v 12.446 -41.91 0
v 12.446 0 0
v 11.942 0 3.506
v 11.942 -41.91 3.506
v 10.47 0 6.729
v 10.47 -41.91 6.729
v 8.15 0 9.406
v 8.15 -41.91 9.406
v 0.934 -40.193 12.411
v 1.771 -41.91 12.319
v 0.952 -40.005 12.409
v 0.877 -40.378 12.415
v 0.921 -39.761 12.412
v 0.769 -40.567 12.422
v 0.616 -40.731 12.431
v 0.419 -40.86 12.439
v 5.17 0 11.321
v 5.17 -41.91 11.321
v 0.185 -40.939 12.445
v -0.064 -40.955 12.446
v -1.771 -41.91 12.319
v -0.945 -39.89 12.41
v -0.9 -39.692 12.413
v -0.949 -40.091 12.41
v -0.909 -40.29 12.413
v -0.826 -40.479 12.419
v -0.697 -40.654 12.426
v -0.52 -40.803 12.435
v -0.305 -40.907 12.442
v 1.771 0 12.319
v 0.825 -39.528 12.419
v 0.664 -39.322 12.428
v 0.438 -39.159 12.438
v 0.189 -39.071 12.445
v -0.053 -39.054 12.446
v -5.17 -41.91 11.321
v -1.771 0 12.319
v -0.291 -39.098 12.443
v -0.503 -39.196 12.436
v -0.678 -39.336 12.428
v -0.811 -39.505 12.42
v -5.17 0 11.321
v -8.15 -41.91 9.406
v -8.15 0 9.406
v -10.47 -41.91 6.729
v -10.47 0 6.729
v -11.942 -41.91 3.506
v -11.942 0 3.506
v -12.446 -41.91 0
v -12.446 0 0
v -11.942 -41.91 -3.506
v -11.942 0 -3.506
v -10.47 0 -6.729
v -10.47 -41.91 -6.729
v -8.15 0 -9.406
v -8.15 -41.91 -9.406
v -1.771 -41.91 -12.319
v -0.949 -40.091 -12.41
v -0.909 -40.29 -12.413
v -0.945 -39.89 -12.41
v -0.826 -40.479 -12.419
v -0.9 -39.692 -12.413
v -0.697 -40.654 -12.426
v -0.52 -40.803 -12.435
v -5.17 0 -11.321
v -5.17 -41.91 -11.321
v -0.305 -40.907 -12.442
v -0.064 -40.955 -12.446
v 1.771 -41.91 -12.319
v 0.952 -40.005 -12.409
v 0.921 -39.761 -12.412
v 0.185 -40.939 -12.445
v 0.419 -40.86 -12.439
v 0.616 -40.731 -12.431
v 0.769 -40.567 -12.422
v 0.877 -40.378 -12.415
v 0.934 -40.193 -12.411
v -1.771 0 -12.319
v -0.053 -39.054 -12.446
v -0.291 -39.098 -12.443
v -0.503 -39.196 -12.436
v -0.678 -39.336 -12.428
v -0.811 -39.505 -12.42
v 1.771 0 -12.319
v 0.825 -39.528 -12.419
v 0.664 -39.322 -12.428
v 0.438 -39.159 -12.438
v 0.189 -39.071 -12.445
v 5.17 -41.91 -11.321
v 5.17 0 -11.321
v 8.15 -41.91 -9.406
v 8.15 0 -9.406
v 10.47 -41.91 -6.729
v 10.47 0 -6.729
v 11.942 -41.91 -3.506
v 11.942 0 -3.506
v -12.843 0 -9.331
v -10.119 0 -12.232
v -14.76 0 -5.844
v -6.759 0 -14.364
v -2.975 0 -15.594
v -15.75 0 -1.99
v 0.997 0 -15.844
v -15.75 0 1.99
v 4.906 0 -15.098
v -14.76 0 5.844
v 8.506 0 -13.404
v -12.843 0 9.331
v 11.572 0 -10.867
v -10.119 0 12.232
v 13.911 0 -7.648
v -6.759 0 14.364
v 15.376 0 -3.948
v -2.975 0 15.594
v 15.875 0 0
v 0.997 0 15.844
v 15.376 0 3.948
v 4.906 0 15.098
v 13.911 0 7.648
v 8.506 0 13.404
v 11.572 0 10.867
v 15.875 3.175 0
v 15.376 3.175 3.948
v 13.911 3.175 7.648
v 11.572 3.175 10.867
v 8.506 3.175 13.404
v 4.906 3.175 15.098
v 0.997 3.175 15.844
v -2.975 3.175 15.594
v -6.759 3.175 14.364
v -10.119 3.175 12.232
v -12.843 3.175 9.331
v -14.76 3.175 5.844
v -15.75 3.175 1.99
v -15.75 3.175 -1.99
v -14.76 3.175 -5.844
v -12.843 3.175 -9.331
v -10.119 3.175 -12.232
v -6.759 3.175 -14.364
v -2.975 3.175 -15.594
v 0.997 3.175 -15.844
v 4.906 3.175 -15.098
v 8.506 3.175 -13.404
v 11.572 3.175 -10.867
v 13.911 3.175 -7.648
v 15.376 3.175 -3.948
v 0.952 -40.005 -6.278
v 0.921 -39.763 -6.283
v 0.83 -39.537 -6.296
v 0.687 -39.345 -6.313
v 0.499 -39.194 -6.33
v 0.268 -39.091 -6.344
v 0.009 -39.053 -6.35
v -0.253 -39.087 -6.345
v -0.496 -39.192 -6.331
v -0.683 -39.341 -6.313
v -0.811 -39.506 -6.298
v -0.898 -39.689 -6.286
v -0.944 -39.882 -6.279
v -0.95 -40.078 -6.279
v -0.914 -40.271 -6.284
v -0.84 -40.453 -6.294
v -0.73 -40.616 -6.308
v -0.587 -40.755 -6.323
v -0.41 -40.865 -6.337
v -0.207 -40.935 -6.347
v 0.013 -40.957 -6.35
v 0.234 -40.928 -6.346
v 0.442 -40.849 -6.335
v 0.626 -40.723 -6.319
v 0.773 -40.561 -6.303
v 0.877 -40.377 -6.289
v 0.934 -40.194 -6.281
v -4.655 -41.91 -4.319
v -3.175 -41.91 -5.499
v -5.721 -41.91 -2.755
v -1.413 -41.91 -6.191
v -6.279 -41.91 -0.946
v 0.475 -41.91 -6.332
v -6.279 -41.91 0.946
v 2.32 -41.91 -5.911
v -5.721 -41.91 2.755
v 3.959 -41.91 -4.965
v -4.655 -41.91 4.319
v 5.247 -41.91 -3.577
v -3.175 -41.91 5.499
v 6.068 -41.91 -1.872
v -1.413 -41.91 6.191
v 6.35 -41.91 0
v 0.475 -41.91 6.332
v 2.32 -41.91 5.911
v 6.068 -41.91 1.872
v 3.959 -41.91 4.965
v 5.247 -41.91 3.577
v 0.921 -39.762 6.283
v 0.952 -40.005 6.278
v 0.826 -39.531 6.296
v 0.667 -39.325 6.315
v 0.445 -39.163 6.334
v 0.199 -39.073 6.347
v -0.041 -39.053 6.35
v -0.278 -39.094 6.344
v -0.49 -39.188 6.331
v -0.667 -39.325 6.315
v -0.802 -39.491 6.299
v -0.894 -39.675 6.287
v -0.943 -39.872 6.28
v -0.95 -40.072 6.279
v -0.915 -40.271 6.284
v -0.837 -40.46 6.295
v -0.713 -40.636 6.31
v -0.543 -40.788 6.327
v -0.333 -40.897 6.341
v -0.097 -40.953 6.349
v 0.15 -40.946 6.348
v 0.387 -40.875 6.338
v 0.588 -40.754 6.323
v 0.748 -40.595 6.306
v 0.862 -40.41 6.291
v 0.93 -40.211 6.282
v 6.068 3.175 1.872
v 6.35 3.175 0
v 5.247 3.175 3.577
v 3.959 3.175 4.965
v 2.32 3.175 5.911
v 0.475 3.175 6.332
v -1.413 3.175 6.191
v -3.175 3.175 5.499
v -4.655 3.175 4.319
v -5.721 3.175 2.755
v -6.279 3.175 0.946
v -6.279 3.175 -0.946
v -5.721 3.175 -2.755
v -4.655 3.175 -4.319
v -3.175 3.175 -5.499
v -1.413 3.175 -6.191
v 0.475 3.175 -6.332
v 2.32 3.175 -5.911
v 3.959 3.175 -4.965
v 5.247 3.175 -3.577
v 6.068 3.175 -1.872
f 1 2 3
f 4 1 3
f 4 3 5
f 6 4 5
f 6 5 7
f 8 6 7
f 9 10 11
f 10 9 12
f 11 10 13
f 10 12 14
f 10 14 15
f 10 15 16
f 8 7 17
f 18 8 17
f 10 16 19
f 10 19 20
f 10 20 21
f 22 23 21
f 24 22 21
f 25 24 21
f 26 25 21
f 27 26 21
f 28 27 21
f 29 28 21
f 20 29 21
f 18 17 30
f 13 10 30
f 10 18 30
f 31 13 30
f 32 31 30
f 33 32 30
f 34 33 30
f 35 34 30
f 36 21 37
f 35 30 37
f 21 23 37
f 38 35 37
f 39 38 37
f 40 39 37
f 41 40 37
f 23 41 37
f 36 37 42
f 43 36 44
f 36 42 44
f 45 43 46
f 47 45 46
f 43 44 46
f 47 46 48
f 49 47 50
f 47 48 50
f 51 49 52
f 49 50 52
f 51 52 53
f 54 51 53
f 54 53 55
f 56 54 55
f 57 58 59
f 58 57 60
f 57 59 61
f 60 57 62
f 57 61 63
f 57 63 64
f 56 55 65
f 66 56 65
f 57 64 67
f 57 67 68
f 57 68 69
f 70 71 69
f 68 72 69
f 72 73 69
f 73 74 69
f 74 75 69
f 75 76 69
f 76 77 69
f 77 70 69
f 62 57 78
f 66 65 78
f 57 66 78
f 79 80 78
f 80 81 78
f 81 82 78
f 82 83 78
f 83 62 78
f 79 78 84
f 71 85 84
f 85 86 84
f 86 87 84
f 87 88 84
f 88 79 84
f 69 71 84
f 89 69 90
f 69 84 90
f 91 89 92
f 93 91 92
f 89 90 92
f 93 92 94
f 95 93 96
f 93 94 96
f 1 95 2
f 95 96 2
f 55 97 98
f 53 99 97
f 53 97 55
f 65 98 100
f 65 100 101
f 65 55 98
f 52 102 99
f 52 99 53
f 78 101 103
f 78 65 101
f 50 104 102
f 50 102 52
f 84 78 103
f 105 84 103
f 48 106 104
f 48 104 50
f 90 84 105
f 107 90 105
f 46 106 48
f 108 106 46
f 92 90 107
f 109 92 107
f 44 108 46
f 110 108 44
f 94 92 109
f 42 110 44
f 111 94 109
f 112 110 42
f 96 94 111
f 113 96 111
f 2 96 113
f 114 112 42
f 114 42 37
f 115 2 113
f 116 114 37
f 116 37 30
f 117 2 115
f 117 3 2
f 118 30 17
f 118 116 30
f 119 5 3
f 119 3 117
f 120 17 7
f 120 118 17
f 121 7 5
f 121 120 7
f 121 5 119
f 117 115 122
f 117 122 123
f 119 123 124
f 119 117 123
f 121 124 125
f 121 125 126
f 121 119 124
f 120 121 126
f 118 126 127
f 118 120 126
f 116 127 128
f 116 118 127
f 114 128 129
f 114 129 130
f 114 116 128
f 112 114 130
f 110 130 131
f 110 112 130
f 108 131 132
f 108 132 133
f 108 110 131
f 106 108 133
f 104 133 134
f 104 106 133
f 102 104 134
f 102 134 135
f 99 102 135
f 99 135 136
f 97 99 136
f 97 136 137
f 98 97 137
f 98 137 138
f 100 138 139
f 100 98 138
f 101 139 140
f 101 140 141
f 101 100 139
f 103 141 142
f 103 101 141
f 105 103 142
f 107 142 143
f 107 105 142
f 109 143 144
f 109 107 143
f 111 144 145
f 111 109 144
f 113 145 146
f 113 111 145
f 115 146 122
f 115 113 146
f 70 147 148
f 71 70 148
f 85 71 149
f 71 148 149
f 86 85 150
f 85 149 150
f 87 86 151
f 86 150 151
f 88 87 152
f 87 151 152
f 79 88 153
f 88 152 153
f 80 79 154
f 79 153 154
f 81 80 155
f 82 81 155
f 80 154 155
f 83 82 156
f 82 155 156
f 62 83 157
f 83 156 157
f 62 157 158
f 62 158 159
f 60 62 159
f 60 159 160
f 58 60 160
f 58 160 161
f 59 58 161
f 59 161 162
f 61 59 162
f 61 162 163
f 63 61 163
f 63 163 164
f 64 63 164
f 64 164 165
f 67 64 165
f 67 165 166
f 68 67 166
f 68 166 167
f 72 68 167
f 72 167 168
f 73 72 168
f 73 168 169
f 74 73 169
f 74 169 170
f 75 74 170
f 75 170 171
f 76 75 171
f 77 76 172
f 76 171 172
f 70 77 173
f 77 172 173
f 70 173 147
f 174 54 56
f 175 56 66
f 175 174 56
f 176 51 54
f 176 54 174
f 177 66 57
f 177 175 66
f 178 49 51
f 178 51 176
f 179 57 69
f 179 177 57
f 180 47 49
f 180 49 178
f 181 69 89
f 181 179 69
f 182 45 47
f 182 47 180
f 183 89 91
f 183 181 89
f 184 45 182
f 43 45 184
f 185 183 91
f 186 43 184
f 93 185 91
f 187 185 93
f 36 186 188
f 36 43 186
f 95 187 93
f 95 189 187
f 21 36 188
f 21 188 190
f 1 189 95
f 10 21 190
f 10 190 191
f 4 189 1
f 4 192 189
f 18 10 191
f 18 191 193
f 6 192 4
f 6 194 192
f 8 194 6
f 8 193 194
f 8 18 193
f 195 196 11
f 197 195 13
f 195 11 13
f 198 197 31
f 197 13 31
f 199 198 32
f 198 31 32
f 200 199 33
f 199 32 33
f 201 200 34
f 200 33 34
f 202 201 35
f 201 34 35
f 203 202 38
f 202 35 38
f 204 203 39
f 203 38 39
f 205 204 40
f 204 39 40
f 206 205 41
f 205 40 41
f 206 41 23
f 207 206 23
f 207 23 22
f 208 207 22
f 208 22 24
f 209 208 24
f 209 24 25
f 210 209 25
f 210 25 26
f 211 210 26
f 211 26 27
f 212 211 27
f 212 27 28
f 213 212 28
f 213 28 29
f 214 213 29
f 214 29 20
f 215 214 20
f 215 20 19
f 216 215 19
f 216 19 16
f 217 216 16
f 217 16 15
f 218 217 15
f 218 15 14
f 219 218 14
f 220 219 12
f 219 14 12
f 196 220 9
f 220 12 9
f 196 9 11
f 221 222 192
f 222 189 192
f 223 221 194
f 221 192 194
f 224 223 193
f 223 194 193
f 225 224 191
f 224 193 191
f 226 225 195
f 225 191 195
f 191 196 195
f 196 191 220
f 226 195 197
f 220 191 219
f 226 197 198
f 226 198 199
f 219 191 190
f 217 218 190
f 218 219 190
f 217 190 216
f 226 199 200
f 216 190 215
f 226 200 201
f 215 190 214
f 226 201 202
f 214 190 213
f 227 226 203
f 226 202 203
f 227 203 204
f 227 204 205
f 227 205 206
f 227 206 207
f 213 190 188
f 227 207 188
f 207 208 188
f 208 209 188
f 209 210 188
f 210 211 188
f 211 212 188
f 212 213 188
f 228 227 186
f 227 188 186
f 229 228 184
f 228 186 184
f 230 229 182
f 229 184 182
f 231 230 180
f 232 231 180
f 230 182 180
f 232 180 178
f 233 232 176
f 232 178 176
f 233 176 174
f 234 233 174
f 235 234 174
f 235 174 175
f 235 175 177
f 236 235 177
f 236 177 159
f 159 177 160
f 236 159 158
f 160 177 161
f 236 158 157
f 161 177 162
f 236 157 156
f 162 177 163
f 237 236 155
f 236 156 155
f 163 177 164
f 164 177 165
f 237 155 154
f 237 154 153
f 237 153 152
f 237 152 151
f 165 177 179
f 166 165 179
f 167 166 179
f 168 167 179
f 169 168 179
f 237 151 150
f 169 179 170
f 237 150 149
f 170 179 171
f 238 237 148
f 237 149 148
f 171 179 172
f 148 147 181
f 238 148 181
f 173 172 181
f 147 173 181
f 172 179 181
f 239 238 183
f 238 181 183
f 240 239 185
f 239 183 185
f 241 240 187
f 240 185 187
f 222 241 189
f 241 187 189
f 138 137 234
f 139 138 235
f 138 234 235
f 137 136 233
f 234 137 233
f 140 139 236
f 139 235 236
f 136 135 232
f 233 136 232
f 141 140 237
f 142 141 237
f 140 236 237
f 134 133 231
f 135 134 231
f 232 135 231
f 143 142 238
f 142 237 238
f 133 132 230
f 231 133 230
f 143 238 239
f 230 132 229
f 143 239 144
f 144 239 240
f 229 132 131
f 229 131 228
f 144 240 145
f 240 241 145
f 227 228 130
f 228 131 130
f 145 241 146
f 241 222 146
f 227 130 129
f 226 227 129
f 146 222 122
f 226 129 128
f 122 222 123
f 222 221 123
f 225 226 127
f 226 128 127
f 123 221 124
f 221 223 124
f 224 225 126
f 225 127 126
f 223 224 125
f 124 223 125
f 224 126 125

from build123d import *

# Parameters (mm, degrees)
F0_R     = 12.446
F0_R_2   = 6.35
F1_DEPTH = 41.91
F2_R     = 15.875
F2_R_2   = 6.35
F3_DEPTH = 3.175
F5_R     = 0.9525
F6_DEPTH = 41.276


with BuildPart() as f1:
    # F0 (on Front) → F1 (new body)
    with BuildSketch(Plane.XZ):
        Circle(F0_R)
        Circle(F0_R_2, mode=Mode.SUBTRACT)
    extrude(amount=F1_DEPTH)

    # F2 (on Front) → F3 (join)
    with BuildSketch(Plane.XZ):
        Circle(F2_R)
        Circle(F2_R_2, mode=Mode.SUBTRACT)
    extrude(amount=-F3_DEPTH)

    # F5 (on offset) → F6 (cut, through all)
    with BuildSketch(Plane.XY.offset(25.4)):
        with Locations((0, -40.005)):
            Circle(F5_R)
    extrude(amount=-F6_DEPTH, mode=Mode.SUBTRACT)


solid = f1.part
